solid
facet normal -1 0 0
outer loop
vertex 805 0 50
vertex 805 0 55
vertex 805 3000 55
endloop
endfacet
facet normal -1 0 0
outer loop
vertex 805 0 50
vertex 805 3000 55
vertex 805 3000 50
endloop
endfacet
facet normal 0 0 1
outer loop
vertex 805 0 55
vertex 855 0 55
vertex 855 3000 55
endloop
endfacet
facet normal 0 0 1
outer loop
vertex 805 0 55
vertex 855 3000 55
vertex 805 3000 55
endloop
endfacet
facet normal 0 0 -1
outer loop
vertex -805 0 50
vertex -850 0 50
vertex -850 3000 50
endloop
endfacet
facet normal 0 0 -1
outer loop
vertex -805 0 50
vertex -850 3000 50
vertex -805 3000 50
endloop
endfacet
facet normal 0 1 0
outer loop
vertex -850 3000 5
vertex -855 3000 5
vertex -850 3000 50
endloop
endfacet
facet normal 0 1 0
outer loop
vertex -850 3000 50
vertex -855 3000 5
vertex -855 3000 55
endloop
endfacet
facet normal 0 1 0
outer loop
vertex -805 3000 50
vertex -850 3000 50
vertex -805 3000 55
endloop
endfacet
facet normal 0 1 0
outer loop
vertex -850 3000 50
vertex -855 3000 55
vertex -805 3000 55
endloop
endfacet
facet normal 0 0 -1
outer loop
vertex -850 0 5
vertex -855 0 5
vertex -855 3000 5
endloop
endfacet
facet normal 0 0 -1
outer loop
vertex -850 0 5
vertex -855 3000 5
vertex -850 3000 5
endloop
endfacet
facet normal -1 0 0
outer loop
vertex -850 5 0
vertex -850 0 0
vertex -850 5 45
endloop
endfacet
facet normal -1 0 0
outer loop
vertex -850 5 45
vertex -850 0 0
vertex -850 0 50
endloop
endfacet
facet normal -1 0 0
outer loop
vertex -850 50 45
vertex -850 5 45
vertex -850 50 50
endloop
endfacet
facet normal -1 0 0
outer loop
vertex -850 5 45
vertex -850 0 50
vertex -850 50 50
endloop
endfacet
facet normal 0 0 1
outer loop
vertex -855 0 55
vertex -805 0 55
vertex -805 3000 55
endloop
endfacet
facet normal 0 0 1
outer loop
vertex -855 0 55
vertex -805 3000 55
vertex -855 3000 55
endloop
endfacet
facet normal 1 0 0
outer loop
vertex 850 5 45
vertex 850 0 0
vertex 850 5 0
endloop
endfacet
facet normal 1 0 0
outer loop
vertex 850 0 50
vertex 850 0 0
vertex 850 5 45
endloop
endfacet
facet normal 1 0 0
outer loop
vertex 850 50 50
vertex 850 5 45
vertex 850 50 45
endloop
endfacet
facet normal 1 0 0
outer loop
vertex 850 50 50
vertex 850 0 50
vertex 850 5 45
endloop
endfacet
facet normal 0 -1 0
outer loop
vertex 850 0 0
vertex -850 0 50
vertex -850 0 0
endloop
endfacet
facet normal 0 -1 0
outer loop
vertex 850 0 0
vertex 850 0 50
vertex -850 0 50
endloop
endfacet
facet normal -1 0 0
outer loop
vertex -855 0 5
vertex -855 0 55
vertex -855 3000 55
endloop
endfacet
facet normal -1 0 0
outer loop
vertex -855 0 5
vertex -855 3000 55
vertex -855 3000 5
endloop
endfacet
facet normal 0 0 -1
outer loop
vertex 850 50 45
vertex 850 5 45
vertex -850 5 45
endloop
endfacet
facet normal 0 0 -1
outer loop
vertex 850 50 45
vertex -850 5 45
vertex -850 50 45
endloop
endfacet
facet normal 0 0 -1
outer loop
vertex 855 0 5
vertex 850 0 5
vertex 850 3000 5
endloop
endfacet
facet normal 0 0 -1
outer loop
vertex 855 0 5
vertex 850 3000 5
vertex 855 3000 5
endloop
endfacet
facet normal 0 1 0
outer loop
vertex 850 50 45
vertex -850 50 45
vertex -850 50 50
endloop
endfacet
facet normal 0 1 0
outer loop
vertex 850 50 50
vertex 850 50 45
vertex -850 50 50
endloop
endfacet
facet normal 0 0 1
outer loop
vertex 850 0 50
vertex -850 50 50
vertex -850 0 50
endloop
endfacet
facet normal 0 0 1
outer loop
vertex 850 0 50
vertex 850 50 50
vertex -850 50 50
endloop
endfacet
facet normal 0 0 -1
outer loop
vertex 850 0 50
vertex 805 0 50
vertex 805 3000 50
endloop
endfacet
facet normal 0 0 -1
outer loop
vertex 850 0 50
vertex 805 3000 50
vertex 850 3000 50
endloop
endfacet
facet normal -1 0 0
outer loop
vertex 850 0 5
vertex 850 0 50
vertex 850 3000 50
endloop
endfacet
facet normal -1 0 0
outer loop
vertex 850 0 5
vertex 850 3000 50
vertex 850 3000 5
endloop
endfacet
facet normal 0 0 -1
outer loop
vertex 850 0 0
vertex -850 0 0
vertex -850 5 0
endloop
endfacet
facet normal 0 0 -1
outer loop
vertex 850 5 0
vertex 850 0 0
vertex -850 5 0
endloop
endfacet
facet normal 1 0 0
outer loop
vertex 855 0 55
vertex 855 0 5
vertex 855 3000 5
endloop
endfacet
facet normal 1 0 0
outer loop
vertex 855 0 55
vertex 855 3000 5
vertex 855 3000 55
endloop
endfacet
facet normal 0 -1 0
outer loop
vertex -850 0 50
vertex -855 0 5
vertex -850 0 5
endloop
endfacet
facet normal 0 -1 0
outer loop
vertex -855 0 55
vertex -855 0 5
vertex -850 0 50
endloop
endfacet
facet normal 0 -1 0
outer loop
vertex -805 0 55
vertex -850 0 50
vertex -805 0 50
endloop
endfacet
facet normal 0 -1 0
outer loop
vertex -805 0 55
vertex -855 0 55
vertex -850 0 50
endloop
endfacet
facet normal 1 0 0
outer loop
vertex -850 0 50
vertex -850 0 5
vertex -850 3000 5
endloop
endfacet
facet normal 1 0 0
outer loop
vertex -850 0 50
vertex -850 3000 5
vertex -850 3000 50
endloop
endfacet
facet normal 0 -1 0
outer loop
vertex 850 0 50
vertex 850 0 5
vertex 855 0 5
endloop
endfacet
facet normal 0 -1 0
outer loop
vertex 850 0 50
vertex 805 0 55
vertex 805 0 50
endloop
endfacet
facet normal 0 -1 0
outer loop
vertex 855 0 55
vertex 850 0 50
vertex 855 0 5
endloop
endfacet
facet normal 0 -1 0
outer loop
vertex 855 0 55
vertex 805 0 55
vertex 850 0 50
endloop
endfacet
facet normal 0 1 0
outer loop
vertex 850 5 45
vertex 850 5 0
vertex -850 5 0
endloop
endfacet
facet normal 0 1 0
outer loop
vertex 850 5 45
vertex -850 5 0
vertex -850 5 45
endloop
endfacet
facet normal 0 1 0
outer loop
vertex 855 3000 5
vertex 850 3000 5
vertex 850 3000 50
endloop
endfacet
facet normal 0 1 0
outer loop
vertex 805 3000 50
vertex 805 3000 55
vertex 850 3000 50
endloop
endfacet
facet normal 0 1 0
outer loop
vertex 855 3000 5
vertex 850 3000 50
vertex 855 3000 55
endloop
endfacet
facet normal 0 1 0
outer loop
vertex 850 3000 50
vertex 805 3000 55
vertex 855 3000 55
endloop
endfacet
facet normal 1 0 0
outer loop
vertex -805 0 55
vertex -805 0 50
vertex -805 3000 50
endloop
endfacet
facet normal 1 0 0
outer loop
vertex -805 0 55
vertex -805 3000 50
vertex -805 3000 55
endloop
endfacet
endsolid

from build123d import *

# Parameters (mm, degrees)
F1_DEPTH = 850
F2_DEPTH = 850
F4_DEPTH = 3000
F6_DEPTH = 3000


with BuildPart() as f1:
    # F0 (on Right) → F1 (new body)
    with BuildSketch(Plane.YZ):
        Polygon((0, 50), (0, 0), (5, 0), (5, 45), (50, 45), (50, 50), align=None)
    extrude(amount=F1_DEPTH)

    # F2 (add): a face of the model
    f2_faces = [f1.faces().sort_by_distance(p)[0] for p in [
        (0, 0.7071067812, 25),
    ]]
    extrude(f2_faces, amount=F2_DEPTH)


with BuildPart() as f4:
    # F3 (on face) → F4 (new body)
    with BuildSketch(Plane.XZ):
        Polygon((805, 50), (850, 50), (850, 5), (855, 5), (855, 55), (805, 55), align=None)
    extrude(amount=-F4_DEPTH)


with BuildPart() as f6:
    # F5 (on face) → F6 (new body)
    with BuildSketch(Plane.XZ):
        Polygon((-850, 5), (-850, 50), (-805, 50), (-805, 55), (-855, 55), (-855, 5), align=None)
    extrude(amount=-F6_DEPTH)


solid = Compound([f1.part, f4.part, f6.part])
